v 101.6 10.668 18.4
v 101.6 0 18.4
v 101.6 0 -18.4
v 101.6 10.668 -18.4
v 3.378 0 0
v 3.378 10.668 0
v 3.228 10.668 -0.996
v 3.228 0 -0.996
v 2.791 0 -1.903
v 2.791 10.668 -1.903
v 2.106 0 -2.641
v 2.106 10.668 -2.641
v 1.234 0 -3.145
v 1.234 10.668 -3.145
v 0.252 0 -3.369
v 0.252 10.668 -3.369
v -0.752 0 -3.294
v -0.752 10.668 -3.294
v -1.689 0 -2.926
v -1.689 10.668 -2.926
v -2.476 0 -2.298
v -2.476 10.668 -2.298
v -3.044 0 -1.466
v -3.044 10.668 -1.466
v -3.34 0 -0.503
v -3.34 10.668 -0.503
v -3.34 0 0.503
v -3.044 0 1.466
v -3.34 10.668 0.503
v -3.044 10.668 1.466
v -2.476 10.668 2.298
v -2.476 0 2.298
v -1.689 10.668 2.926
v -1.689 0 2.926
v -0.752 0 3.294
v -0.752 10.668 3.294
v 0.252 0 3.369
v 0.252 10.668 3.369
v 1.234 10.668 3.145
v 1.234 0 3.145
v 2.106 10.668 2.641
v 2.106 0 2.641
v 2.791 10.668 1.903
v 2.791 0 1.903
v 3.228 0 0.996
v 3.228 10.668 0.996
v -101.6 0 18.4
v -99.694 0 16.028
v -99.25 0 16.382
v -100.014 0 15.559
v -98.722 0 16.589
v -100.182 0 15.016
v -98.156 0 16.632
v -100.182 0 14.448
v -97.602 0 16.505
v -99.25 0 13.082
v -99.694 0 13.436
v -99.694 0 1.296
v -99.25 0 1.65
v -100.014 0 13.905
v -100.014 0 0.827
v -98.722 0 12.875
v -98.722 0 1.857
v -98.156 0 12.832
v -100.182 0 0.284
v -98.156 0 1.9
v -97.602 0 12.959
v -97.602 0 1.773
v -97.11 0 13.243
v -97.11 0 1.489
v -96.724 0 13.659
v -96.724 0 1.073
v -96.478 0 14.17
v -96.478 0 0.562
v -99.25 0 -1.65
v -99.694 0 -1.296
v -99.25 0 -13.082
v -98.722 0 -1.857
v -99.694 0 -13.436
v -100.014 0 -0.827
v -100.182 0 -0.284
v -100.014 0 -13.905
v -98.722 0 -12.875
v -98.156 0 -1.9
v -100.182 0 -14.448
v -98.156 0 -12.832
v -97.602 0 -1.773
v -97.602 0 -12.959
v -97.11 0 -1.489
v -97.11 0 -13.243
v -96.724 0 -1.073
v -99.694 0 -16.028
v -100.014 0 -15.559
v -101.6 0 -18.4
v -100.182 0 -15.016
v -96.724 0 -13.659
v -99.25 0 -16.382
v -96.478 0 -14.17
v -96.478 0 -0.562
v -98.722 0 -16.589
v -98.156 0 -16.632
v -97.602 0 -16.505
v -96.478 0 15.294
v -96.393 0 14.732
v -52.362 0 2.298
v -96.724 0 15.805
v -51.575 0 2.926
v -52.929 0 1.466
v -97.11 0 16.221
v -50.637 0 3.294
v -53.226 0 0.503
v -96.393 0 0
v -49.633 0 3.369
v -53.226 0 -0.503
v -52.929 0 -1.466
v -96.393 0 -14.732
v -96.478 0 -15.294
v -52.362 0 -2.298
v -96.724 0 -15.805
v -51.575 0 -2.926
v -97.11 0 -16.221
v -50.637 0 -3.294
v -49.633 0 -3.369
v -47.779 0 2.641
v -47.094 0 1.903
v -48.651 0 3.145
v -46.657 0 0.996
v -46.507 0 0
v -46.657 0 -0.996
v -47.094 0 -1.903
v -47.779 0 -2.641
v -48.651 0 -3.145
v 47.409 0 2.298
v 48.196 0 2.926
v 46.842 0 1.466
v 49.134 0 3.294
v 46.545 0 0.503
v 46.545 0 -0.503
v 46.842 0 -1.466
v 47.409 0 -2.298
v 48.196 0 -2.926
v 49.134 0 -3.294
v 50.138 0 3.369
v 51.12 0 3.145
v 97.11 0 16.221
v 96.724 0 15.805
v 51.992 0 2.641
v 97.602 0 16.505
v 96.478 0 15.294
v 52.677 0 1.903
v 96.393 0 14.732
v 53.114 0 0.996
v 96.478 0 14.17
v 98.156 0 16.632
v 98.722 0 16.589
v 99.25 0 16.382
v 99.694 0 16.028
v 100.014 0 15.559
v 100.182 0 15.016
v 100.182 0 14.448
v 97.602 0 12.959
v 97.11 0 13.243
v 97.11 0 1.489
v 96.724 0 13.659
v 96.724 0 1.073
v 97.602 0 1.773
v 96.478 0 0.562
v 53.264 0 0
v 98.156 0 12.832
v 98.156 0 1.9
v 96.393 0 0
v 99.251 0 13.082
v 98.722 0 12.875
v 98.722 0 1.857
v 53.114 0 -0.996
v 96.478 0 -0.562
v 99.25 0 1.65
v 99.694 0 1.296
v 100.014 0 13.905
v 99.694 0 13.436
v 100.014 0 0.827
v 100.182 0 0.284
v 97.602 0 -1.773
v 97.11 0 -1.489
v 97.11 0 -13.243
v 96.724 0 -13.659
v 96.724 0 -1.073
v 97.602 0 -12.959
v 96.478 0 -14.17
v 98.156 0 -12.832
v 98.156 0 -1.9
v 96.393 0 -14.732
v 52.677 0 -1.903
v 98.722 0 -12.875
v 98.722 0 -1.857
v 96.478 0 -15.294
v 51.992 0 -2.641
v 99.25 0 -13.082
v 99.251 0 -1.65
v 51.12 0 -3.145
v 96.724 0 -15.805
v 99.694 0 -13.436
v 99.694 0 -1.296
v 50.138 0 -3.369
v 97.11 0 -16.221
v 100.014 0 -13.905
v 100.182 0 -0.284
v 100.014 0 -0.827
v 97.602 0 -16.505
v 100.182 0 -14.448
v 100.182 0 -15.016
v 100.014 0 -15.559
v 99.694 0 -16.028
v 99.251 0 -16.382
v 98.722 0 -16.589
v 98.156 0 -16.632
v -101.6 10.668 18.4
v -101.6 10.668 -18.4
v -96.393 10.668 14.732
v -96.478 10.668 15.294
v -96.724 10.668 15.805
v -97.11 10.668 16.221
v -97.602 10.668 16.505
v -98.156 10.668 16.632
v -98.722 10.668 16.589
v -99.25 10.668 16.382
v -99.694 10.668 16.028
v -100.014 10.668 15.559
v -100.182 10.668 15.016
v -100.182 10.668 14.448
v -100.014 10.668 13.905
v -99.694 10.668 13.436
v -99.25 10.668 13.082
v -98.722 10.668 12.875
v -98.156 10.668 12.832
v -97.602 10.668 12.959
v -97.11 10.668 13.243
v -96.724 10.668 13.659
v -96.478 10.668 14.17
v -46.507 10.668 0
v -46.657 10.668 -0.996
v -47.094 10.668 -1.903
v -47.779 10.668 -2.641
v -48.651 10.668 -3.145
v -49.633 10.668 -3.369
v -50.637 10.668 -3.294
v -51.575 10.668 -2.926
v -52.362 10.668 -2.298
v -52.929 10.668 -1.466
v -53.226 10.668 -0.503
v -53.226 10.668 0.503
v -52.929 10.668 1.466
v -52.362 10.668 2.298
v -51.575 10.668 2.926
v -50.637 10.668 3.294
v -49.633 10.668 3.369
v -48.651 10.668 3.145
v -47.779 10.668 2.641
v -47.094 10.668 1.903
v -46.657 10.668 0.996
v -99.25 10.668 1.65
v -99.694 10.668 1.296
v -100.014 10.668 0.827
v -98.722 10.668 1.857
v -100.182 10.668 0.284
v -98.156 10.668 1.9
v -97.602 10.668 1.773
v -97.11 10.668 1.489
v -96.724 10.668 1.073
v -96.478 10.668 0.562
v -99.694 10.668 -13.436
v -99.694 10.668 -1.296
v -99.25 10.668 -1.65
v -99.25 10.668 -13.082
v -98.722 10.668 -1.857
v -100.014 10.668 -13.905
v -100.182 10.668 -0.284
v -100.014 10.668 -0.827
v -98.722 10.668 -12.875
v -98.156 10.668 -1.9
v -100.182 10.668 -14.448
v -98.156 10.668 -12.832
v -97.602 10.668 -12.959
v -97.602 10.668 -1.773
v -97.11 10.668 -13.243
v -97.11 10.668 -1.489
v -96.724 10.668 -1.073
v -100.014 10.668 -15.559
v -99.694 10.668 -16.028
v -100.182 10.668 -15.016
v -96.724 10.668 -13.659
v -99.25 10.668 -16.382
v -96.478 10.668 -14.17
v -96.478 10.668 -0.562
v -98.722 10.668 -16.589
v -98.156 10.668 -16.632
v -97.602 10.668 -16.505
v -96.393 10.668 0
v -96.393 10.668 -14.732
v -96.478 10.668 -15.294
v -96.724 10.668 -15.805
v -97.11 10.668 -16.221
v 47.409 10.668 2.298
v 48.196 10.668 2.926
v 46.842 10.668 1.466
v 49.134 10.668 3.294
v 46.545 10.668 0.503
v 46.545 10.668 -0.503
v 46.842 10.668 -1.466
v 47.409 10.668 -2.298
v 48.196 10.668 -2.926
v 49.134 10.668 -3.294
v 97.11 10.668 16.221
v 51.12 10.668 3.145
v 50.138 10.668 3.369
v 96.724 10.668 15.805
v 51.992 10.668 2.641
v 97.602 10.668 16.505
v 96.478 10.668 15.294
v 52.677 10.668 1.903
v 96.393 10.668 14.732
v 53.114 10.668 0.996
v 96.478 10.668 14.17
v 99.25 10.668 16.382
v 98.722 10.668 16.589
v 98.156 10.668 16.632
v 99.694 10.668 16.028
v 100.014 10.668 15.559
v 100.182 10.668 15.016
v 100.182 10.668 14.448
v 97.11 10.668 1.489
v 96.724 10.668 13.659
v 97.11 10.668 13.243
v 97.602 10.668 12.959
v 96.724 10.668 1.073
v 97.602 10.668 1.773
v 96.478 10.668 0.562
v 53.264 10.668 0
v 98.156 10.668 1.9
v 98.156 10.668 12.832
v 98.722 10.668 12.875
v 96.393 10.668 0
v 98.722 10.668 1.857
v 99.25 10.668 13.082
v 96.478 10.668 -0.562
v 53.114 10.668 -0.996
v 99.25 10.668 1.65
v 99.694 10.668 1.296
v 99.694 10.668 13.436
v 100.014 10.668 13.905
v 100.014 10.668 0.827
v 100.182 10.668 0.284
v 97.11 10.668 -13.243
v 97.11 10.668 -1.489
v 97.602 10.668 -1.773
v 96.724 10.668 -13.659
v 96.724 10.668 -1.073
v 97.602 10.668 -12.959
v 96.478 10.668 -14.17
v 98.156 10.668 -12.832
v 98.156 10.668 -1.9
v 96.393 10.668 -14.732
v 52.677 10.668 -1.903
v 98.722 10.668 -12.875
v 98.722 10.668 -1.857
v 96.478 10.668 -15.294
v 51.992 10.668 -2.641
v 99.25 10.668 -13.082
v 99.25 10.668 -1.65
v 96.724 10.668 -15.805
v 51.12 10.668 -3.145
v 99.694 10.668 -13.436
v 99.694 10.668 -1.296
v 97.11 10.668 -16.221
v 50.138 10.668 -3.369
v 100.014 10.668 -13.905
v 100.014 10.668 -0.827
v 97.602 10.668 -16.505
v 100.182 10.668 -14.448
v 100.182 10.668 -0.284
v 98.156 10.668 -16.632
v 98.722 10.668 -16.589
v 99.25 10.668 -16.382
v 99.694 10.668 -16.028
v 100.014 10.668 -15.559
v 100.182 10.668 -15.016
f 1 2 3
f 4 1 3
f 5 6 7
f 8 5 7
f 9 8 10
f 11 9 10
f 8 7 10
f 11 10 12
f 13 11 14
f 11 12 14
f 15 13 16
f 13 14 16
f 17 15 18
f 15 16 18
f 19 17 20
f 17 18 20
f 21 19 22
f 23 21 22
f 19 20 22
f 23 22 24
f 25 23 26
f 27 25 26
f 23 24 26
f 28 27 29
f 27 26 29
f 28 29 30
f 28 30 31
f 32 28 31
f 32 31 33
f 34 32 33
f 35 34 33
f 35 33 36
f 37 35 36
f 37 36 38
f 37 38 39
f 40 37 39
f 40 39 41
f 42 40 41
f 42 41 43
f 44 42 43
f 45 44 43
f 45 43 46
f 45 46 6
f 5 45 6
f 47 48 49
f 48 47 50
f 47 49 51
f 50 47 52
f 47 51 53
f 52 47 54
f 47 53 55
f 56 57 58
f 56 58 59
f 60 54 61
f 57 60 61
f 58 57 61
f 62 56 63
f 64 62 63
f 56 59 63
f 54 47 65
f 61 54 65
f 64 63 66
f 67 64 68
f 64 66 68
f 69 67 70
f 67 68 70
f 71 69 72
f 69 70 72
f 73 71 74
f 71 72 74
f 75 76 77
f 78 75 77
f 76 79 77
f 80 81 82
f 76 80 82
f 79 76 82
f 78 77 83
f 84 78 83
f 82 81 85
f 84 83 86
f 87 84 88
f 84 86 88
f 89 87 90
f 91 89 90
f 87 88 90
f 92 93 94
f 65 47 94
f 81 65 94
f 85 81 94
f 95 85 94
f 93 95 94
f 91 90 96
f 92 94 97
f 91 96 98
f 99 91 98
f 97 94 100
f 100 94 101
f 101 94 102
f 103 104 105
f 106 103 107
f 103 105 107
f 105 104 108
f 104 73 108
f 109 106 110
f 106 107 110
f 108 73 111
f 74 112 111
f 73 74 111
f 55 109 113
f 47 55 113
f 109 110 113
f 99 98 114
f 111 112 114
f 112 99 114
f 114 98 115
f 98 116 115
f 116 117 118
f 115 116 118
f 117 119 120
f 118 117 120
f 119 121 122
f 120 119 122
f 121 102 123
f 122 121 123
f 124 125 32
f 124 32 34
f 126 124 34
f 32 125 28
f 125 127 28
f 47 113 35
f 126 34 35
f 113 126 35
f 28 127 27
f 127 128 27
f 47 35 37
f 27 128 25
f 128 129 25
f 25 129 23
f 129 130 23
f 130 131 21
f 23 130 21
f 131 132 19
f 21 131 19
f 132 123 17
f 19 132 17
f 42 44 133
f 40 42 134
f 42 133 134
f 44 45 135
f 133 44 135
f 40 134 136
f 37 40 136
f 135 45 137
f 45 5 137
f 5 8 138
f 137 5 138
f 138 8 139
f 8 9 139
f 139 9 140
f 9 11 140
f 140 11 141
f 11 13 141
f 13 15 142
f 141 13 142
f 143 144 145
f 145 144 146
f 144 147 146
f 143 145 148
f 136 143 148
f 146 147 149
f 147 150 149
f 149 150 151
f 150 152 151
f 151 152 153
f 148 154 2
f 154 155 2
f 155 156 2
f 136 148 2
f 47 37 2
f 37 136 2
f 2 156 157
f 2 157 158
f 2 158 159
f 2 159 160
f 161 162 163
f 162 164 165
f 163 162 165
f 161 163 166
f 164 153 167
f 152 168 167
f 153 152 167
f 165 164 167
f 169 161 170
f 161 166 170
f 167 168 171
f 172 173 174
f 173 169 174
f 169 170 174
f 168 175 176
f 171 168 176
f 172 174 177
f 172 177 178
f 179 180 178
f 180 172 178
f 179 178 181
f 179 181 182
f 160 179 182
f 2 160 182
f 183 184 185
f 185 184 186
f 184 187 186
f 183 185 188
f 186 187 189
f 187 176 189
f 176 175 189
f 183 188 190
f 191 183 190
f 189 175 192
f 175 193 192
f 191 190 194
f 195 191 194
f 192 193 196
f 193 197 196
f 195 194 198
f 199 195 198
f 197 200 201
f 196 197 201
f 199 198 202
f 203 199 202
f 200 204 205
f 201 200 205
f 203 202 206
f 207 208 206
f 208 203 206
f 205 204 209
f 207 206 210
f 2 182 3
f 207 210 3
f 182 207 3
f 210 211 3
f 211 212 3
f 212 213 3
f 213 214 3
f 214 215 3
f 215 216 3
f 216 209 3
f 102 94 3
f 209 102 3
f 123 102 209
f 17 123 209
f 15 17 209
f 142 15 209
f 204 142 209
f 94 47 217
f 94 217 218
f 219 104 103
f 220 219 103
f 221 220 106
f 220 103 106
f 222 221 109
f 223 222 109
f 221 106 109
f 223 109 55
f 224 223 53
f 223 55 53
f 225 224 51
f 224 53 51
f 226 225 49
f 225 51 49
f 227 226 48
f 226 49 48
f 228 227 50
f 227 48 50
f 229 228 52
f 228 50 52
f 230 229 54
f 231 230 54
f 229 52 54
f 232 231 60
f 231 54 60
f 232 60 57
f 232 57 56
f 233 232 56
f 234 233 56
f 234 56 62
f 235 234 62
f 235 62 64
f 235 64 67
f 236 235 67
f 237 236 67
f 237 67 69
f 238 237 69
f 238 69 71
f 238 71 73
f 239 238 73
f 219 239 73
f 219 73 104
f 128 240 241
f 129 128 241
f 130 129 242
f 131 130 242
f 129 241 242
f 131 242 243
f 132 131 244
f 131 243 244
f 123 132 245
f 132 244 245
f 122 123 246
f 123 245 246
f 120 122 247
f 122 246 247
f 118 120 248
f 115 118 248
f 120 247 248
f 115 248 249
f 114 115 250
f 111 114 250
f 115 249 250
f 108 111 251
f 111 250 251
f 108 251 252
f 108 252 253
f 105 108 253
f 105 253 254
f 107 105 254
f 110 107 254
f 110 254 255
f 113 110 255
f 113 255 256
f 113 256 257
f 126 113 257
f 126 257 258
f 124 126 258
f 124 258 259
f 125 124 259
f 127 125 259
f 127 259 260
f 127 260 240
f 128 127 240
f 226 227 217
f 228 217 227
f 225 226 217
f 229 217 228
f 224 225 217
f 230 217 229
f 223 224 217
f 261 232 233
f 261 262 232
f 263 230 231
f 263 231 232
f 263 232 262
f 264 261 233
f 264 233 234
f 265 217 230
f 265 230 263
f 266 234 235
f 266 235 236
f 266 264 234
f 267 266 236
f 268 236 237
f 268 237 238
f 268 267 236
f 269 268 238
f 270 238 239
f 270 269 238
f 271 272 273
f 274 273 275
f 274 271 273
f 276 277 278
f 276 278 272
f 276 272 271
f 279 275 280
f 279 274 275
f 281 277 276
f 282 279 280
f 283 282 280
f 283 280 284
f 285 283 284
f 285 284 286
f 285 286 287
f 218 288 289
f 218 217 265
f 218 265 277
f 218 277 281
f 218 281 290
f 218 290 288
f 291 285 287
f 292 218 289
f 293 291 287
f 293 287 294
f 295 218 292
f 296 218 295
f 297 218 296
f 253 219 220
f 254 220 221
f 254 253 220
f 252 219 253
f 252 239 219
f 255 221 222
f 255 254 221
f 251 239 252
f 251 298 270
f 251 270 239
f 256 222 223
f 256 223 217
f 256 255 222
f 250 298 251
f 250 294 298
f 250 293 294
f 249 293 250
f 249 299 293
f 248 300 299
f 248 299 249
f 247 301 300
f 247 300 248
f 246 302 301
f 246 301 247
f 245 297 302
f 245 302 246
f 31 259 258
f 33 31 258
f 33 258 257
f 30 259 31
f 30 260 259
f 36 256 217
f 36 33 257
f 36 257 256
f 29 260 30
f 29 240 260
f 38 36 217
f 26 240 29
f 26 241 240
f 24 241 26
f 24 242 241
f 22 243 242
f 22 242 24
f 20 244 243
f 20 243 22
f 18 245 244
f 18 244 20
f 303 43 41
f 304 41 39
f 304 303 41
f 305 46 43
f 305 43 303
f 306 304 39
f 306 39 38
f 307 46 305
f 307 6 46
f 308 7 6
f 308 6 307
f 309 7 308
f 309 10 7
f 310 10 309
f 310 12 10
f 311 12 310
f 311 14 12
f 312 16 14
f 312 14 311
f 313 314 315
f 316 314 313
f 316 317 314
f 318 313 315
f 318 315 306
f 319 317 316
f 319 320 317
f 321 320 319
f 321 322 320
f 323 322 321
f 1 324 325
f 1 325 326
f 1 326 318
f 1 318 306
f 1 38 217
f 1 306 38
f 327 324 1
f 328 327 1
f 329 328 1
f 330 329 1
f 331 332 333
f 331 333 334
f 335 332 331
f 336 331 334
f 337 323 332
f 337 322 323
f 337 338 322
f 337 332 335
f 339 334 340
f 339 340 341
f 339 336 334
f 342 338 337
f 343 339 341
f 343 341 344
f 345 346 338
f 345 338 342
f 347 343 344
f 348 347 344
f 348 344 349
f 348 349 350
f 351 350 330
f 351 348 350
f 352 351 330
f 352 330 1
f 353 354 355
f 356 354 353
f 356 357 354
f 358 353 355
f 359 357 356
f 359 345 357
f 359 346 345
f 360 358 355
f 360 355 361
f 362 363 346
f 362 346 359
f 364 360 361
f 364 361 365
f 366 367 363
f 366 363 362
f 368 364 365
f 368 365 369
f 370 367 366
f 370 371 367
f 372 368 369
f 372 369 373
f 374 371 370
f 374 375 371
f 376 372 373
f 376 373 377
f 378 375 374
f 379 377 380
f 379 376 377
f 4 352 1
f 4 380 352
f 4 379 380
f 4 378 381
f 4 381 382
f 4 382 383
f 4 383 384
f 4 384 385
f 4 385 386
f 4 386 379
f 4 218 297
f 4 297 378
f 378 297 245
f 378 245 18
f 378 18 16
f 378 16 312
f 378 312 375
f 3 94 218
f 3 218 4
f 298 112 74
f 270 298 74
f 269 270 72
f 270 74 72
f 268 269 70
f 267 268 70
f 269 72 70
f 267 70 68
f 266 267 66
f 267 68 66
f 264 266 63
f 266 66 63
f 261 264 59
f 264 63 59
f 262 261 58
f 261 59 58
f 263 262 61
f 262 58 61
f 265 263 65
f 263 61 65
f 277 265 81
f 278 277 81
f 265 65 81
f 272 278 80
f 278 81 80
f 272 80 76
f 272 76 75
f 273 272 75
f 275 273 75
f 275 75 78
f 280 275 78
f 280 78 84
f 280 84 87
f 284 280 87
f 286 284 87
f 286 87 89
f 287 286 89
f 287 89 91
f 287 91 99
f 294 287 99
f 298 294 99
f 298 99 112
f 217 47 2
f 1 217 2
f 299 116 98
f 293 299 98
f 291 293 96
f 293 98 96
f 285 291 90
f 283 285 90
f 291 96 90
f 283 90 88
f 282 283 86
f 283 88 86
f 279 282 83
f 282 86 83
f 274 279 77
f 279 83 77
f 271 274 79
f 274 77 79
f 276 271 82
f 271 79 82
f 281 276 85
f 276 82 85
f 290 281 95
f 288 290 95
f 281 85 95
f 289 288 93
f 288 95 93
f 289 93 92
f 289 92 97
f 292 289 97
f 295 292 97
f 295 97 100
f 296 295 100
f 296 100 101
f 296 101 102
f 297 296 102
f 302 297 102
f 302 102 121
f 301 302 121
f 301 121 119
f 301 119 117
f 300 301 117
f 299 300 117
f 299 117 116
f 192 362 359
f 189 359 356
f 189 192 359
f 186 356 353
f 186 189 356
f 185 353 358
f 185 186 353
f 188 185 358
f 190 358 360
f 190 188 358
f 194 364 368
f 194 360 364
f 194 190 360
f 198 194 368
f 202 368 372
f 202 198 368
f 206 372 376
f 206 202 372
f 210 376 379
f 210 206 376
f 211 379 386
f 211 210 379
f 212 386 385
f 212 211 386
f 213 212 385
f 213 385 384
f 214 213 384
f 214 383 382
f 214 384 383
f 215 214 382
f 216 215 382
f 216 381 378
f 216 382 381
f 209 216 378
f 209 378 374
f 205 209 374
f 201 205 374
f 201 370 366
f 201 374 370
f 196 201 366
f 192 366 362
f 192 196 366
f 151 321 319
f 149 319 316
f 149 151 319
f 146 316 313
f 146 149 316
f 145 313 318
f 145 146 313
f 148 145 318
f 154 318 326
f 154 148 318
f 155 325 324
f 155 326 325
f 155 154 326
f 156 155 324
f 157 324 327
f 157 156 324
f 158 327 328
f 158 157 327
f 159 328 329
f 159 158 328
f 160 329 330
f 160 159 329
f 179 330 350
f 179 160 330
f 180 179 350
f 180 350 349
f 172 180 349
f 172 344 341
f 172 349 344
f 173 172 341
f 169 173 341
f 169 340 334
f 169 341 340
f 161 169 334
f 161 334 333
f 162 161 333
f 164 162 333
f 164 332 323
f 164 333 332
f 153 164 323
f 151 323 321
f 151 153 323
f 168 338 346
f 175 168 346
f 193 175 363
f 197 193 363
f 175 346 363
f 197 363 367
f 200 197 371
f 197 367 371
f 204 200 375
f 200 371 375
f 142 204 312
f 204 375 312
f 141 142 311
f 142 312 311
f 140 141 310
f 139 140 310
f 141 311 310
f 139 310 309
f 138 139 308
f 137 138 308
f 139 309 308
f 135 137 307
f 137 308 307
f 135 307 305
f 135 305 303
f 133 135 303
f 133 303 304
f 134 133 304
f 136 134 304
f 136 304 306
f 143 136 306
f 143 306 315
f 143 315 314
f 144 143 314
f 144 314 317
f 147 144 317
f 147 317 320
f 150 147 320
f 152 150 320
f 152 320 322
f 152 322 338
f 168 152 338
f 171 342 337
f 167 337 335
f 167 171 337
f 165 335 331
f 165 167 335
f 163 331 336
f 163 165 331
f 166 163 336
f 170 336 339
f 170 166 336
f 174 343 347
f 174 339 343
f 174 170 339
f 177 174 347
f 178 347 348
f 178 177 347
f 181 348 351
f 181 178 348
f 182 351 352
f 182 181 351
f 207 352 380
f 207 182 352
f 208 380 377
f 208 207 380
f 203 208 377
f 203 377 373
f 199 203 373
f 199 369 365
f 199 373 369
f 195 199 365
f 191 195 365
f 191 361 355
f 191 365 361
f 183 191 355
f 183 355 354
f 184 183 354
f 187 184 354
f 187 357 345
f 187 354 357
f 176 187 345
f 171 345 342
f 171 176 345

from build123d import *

# Parameters (mm, degrees)
SKETCH1_W           = 203.2
SKETCH1_H           = 36.79952
BOSS_EXTRUDE1_DEPTH = 10.668
SKETCH3_R           = 1.905
CUT_EXTRUDE1_DEPTH  = 11.668
SKETCH4_R           = 3.3782
CUT_EXTRUDE2_DEPTH  = 11.668


with BuildPart() as part:
    # Sketch1 → Boss-Extrude1 (new body)
    with BuildSketch(Plane(origin=(0, 0, 0), x_dir=(1, 0, 0), z_dir=(0, 1, 0))):
        Rectangle(SKETCH1_W, SKETCH1_H)
    extrude(amount=BOSS_EXTRUDE1_DEPTH)

    # Sketch3 → Cut-Extrude1 (cut, through all)
    with BuildSketch(Plane.XZ):
        with Locations((-98.298, 14.732)):
            Circle(SKETCH3_R)
        with Locations((-98.298, 0)):
            Circle(SKETCH3_R)
        with Locations((-98.298, -14.732)):
            Circle(SKETCH3_R)
    cut_extrude1 = extrude(amount=-CUT_EXTRUDE1_DEPTH, mode=Mode.SUBTRACT)

    # Mirror1: Cut-Extrude1 across plane
    add(cut_extrude1.mirror(Plane(origin=(0, 0, 0), x_dir=(0, 0, 1), z_dir=(1, 0, 0))), mode=Mode.SUBTRACT)

    # Sketch4 → Cut-Extrude2 (cut, through all)
    with BuildSketch(Plane(origin=(0, 10.668, 0), x_dir=(1, 0, 0), z_dir=(0, 1, 0))):
        with Locations((-49.8856, 0)):
            Circle(SKETCH4_R)
        Circle(SKETCH4_R)
        with Locations((49.8856, 0)):
            Circle(SKETCH4_R)
    extrude(amount=-CUT_EXTRUDE2_DEPTH, mode=Mode.SUBTRACT)


solid = part.part
